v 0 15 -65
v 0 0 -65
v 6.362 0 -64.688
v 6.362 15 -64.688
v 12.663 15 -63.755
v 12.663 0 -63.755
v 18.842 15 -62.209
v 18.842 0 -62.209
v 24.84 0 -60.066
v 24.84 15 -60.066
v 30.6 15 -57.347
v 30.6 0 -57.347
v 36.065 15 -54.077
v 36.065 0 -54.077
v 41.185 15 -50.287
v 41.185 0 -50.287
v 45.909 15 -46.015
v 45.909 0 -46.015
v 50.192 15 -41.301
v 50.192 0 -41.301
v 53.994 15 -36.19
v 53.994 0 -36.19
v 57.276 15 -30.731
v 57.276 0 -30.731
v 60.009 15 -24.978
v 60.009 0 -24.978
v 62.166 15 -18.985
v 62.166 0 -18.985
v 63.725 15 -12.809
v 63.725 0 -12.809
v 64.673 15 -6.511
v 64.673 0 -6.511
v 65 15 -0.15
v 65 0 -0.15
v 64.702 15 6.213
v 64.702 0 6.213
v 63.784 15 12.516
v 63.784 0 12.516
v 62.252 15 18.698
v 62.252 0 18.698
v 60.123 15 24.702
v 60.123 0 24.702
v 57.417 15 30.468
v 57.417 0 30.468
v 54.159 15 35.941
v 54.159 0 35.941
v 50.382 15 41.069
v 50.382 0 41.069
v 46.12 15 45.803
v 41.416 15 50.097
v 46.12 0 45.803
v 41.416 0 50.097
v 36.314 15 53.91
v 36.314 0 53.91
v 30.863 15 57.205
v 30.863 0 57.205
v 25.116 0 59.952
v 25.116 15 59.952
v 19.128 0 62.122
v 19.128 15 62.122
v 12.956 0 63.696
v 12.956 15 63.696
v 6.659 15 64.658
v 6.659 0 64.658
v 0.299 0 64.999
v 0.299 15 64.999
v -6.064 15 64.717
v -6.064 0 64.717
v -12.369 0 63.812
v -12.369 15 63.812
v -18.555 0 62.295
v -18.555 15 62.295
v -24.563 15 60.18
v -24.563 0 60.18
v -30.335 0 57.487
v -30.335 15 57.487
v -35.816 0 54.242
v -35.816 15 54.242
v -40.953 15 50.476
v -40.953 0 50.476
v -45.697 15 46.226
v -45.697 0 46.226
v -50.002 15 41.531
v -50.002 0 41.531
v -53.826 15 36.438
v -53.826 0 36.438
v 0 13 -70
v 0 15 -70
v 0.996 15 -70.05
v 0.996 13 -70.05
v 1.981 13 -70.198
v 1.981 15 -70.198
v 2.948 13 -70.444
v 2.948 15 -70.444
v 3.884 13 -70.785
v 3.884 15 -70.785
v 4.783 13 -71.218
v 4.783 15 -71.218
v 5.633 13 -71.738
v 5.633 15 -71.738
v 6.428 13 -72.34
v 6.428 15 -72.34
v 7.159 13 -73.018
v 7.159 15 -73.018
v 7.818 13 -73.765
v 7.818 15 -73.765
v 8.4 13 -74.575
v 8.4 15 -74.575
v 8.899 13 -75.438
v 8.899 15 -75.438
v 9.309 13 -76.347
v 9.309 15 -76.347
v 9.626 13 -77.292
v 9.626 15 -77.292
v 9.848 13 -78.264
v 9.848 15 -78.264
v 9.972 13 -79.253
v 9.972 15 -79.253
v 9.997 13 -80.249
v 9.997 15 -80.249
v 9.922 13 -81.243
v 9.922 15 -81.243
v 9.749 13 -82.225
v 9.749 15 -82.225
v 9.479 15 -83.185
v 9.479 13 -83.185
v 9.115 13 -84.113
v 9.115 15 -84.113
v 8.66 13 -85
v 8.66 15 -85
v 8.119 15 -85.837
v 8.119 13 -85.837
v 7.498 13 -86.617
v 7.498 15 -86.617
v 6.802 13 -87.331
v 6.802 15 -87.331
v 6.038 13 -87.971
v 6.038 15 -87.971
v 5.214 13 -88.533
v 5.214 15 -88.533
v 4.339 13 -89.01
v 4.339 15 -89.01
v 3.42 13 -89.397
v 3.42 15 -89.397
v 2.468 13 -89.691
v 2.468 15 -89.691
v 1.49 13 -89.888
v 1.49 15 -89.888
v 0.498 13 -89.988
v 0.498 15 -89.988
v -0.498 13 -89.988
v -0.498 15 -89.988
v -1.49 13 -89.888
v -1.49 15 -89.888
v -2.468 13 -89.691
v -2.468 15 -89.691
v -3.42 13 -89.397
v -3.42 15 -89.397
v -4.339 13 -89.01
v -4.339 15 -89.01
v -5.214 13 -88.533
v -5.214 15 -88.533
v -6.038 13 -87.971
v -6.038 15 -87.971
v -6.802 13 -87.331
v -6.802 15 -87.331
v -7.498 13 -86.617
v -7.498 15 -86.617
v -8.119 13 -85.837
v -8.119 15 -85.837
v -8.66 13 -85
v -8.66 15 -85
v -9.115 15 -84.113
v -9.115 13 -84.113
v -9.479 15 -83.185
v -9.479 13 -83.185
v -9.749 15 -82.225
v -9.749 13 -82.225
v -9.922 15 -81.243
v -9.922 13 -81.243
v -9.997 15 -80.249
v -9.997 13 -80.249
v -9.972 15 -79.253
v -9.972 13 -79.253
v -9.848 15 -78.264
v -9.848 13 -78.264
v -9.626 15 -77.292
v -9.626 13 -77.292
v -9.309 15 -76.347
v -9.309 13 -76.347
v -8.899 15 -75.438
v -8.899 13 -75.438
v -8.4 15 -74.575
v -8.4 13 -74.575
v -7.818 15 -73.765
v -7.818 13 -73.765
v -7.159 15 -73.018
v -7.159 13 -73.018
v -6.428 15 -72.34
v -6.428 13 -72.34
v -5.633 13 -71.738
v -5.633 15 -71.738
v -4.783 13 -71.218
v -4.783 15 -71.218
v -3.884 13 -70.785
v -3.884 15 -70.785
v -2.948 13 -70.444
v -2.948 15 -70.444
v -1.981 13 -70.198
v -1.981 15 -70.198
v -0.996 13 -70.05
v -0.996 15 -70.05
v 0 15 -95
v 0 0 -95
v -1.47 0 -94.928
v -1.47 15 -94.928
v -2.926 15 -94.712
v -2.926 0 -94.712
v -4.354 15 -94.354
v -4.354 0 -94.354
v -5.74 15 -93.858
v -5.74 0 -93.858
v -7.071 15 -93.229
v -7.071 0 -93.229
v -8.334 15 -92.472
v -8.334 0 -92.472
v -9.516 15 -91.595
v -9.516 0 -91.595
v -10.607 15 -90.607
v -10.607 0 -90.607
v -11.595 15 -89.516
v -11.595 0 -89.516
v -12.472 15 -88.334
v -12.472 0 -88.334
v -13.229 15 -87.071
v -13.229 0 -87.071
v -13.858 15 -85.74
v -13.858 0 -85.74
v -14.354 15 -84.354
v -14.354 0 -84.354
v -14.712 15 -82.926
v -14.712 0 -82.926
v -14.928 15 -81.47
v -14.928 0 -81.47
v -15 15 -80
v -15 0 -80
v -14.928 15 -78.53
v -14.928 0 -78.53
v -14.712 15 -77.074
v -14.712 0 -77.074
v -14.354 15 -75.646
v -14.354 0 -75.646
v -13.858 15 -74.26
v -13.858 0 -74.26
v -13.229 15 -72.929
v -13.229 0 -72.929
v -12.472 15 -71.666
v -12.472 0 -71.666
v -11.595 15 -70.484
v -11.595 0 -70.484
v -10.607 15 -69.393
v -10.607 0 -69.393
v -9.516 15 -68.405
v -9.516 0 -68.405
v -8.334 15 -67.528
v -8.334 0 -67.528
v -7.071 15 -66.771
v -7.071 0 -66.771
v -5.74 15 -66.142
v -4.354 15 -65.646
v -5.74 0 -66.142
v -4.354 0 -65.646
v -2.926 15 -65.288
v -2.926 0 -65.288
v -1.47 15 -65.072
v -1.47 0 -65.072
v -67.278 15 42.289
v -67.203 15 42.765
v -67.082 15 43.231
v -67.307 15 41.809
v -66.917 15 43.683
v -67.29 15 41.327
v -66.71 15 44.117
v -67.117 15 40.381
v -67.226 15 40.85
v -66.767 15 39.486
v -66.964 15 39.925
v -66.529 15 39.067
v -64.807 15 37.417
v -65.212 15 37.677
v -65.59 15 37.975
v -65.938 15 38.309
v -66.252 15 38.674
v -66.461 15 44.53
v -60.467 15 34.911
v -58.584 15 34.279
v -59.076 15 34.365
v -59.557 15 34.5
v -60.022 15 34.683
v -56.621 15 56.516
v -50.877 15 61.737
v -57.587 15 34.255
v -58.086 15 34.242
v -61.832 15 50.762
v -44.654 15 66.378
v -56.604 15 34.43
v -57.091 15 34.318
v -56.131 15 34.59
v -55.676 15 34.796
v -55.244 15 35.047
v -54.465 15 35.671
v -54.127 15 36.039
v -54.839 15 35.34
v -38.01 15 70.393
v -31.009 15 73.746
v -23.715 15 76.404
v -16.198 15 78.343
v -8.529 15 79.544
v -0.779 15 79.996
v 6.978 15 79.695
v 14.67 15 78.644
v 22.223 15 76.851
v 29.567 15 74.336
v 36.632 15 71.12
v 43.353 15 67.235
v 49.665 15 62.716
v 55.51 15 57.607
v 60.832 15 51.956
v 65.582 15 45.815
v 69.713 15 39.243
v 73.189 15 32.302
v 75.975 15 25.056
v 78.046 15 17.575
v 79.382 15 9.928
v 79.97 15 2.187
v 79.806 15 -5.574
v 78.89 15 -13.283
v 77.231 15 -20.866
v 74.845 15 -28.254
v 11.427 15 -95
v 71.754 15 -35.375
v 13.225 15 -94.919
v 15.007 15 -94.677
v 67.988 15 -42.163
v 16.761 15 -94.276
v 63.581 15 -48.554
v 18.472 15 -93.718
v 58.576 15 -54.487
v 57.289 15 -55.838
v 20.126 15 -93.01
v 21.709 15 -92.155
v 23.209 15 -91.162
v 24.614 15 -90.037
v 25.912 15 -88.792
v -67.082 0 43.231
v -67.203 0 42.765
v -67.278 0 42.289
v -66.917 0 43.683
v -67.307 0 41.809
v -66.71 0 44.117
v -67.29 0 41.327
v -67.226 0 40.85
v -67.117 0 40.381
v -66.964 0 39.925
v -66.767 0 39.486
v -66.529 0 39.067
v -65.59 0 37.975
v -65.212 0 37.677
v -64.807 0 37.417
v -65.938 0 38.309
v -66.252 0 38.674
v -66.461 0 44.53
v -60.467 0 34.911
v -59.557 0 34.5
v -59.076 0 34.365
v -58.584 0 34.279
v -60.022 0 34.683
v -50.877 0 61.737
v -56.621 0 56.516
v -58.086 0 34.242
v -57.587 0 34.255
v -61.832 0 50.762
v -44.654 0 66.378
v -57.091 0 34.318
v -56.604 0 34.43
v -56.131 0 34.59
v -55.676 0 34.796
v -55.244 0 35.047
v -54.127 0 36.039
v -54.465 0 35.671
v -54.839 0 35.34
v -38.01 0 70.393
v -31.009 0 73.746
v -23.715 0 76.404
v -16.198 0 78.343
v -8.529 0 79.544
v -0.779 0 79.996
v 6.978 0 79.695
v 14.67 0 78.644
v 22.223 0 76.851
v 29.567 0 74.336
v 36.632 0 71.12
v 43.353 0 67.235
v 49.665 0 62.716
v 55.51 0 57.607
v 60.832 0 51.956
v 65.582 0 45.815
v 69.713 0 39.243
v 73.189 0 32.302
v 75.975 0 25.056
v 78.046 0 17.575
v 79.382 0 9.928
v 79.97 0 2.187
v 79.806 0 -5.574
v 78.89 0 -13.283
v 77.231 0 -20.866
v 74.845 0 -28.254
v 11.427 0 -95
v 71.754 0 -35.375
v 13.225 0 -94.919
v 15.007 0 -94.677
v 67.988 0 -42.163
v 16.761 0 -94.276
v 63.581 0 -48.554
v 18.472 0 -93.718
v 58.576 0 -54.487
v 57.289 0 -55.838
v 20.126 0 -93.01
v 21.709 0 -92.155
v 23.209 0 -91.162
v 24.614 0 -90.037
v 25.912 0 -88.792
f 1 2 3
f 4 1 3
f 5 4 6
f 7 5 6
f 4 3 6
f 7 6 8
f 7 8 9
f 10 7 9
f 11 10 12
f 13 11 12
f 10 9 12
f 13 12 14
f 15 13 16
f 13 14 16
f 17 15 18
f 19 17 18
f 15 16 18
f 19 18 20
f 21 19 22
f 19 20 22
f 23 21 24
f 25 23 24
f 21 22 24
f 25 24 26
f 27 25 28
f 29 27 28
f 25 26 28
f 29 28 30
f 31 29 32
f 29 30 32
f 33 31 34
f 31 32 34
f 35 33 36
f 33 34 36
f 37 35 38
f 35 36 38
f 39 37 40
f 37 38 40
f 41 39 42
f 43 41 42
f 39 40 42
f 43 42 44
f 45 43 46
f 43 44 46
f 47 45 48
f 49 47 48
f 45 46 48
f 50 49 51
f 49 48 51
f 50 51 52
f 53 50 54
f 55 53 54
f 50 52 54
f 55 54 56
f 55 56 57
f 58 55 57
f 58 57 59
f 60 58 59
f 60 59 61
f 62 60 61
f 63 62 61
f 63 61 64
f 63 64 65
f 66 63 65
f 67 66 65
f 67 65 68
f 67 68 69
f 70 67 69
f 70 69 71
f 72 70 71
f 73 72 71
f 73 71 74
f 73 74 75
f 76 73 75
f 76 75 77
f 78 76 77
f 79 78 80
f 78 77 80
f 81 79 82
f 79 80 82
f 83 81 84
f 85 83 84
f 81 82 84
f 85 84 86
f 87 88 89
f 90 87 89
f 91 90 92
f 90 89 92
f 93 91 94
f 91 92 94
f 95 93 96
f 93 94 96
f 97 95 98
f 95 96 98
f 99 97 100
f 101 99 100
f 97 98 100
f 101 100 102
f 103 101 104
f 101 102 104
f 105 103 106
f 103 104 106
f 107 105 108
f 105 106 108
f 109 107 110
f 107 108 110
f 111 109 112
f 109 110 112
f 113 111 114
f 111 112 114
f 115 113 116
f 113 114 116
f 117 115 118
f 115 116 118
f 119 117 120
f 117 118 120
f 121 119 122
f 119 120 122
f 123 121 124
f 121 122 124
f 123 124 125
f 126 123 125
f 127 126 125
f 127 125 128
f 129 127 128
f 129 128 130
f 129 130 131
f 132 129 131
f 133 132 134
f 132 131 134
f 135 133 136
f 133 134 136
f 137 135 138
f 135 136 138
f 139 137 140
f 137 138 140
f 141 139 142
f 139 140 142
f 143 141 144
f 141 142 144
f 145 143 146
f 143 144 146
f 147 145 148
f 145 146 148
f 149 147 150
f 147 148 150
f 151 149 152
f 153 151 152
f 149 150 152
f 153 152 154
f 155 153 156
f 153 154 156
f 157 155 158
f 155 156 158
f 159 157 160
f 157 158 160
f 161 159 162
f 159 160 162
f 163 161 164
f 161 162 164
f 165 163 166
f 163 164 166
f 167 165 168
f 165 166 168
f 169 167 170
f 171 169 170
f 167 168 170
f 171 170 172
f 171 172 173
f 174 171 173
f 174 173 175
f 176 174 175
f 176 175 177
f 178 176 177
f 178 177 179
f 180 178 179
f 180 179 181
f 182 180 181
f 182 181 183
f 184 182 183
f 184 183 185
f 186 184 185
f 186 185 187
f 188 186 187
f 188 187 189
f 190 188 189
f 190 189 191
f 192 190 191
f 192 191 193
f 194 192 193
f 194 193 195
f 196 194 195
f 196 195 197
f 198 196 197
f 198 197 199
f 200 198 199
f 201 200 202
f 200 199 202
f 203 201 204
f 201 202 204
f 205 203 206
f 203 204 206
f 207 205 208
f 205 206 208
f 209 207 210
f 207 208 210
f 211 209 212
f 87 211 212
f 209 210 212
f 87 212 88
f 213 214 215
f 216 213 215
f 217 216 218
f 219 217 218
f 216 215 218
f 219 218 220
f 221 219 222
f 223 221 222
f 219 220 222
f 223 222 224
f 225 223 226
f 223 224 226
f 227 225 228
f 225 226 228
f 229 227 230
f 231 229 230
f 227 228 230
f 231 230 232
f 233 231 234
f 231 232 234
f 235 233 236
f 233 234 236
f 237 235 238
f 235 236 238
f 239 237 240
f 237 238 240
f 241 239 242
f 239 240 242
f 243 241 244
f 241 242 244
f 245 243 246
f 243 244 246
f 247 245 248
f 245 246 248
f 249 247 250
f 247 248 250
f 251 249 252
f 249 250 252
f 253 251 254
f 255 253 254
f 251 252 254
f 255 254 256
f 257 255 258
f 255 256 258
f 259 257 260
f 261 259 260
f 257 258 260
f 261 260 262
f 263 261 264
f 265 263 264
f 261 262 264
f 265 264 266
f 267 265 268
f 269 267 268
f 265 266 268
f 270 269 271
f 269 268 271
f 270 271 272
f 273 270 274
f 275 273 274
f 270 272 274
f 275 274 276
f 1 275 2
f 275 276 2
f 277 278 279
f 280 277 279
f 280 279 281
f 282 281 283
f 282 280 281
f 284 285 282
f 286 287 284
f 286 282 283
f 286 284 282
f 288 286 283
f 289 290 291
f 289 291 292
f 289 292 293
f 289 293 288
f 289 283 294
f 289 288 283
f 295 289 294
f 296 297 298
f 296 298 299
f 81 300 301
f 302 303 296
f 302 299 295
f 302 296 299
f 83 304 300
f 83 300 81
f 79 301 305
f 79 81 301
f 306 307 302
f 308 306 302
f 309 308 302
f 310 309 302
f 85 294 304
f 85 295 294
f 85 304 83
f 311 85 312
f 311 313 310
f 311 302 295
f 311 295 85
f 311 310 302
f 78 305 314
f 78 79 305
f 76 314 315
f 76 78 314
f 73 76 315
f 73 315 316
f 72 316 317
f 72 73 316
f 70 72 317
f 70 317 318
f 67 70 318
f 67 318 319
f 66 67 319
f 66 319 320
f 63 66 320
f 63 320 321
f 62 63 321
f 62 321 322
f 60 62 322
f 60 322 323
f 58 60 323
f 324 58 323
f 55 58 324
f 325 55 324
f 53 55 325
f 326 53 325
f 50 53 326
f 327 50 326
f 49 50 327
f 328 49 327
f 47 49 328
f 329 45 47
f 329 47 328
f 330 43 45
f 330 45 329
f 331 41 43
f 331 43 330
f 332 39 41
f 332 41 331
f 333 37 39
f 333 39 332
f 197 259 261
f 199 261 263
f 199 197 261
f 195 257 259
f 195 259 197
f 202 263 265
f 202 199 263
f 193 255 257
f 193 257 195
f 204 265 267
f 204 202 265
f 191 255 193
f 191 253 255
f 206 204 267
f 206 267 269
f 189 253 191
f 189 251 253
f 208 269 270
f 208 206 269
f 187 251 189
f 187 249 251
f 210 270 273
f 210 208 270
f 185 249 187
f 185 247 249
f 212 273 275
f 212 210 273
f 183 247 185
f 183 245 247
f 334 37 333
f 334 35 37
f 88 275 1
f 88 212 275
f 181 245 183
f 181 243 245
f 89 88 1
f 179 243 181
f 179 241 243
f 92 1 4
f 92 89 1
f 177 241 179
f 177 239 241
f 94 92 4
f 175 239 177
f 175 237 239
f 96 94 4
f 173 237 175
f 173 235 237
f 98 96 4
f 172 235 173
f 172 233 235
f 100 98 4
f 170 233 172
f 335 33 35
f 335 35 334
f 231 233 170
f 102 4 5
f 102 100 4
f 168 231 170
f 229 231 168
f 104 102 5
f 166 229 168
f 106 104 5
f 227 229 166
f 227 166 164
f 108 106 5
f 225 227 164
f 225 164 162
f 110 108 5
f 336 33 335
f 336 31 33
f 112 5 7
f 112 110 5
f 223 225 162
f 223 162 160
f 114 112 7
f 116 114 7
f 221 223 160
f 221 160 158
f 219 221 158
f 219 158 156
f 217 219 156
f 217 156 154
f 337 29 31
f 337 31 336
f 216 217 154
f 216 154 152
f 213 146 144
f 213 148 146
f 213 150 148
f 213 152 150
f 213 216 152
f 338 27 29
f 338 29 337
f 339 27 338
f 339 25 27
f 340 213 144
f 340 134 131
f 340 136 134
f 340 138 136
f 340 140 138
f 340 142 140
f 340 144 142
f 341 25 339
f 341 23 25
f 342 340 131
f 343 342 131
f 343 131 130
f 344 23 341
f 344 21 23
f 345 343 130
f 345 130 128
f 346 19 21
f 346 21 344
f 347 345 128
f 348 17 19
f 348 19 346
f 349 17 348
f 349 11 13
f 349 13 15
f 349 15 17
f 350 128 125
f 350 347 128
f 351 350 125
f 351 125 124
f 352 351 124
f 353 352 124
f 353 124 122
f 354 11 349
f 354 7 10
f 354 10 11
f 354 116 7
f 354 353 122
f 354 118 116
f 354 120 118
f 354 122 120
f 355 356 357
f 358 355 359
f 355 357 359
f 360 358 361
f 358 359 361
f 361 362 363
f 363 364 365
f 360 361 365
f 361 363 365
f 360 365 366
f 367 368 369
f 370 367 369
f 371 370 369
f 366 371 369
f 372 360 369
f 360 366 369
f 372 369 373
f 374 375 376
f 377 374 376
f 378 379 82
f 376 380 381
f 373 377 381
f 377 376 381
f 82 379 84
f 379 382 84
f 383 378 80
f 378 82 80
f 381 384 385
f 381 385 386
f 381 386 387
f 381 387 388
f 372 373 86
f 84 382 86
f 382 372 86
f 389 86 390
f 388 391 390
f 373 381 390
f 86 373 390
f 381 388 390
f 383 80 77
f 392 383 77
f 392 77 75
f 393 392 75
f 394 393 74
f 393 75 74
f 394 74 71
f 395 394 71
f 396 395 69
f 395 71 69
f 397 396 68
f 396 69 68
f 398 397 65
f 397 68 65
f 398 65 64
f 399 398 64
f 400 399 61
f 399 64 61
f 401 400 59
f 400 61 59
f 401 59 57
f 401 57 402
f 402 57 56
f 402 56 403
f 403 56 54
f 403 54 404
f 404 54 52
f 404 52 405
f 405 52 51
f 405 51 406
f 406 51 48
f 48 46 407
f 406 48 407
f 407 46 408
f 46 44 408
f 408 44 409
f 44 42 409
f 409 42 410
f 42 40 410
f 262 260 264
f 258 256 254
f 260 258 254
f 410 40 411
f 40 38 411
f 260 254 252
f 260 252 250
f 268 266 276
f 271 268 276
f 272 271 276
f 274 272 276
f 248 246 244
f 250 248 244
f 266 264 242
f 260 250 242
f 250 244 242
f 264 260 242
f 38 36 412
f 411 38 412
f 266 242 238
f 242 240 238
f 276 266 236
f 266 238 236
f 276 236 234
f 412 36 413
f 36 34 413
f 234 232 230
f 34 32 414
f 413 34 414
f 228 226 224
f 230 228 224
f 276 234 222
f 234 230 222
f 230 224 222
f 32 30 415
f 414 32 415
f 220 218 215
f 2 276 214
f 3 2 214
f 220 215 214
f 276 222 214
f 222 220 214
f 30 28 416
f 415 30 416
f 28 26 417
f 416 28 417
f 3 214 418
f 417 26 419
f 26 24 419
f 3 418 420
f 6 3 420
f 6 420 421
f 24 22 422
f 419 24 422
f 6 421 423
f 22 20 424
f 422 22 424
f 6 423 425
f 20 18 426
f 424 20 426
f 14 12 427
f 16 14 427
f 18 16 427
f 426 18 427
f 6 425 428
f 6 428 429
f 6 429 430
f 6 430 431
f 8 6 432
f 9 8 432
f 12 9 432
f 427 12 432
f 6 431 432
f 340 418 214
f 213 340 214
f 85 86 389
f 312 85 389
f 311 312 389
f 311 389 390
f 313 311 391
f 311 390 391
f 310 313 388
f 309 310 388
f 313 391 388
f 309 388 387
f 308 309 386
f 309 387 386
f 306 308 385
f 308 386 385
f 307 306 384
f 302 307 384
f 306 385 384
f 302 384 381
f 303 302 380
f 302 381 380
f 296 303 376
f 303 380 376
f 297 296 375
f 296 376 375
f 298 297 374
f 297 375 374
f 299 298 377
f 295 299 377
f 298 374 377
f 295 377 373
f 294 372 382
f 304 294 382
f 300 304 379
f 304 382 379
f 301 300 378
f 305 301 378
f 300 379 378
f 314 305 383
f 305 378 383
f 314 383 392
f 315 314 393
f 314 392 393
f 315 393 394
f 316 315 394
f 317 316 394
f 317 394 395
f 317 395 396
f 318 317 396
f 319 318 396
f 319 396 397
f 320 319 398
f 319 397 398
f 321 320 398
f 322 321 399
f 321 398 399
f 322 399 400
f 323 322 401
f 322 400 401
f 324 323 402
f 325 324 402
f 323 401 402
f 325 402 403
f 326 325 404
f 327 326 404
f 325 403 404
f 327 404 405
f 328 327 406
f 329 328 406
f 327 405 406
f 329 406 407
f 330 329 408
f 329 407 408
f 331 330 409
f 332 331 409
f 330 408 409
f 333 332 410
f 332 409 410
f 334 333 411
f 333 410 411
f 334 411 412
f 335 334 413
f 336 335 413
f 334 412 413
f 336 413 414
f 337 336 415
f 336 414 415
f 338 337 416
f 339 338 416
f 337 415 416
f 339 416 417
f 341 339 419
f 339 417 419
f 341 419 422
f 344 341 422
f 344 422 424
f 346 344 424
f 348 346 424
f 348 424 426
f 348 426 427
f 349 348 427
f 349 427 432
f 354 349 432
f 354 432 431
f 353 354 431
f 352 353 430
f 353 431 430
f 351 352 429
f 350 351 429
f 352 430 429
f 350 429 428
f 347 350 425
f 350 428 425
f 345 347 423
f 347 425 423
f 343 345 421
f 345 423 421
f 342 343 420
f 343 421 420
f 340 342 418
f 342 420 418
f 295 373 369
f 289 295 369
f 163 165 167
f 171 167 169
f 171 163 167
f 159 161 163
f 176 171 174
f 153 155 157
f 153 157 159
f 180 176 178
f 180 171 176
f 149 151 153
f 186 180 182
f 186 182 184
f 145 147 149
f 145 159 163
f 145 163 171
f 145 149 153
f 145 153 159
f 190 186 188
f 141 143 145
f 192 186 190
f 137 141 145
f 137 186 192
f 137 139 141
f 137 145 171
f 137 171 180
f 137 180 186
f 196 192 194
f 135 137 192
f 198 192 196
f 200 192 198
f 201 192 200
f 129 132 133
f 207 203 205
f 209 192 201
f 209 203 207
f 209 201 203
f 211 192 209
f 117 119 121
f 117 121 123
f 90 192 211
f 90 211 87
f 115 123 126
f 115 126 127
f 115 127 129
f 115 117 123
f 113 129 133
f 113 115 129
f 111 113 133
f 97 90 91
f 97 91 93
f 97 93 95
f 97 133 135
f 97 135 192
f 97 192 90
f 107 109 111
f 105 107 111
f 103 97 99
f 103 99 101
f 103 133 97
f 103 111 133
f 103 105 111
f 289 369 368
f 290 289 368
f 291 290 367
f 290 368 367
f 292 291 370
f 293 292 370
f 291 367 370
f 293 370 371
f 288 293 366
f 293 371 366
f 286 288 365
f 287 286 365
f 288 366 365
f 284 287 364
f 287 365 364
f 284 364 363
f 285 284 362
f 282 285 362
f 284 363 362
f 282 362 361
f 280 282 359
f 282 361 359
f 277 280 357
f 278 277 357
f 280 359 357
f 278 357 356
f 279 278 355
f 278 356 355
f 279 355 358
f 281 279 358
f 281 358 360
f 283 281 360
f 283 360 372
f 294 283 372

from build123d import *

# Parameters (mm, degrees)
EXTRUDE_4_DEPTH     = 15
SKETCH_3_R          = 10
CUT_EXTRUDE_1_DEPTH = 2


with BuildPart() as part:
    # ｽｹｯﾁ2 → ﾎﾞｽ - 押し出し4 (new body)
    with BuildSketch(Plane(origin=(0, 0, 0), x_dir=(1, 0, 0), z_dir=(0, 1, 0))):
        with BuildLine():
            ThreePointArc((-53.82643789, -36.437818048), (-56.846261527, -34.367935813), (-60.466933112, -34.910600109))
            Line((-60.466933112, -34.910600109), (-64.807406984, -37.416573868))
            ThreePointArc((-64.807406984, -37.416573868), (-67.177509772, -40.614402853), (-66.461234116, -44.529814279))
            ThreePointArc((-66.461234116, -44.529814279), (49.665387485, -62.716419588), (58.57572973, 54.487465409))
            Line((58.57572973, 54.487465409), (57.289371136, 55.838409315))
            Line((57.289371136, 55.838409315), (25.911523347, 88.791671712))
            ThreePointArc((25.911523347, 88.791671712), (19.306695871, 93.382511176), (11.427401304, 95))
            Line((11.427401304, 95), (0, 95))
            ThreePointArc((0, 95), (-15, 80), (0, 65))
            ThreePointArc((0, 65), (57.41714976, -30.467538684), (-53.82643789, -36.437818048))
        make_face()
    extrude(amount=EXTRUDE_4_DEPTH)

    # ｽｹｯﾁ3 → ｶｯﾄ - 押し出し1 (cut)
    with BuildSketch(Plane(origin=(0, 15, 0), x_dir=(1, 0, 0), z_dir=(0, 1, 0))):
        with Locations(Location((0, 80, 0), (0, 0, 270))):
            Circle(SKETCH_3_R)
    extrude(amount=-CUT_EXTRUDE_1_DEPTH, mode=Mode.SUBTRACT)


solid = part.part
